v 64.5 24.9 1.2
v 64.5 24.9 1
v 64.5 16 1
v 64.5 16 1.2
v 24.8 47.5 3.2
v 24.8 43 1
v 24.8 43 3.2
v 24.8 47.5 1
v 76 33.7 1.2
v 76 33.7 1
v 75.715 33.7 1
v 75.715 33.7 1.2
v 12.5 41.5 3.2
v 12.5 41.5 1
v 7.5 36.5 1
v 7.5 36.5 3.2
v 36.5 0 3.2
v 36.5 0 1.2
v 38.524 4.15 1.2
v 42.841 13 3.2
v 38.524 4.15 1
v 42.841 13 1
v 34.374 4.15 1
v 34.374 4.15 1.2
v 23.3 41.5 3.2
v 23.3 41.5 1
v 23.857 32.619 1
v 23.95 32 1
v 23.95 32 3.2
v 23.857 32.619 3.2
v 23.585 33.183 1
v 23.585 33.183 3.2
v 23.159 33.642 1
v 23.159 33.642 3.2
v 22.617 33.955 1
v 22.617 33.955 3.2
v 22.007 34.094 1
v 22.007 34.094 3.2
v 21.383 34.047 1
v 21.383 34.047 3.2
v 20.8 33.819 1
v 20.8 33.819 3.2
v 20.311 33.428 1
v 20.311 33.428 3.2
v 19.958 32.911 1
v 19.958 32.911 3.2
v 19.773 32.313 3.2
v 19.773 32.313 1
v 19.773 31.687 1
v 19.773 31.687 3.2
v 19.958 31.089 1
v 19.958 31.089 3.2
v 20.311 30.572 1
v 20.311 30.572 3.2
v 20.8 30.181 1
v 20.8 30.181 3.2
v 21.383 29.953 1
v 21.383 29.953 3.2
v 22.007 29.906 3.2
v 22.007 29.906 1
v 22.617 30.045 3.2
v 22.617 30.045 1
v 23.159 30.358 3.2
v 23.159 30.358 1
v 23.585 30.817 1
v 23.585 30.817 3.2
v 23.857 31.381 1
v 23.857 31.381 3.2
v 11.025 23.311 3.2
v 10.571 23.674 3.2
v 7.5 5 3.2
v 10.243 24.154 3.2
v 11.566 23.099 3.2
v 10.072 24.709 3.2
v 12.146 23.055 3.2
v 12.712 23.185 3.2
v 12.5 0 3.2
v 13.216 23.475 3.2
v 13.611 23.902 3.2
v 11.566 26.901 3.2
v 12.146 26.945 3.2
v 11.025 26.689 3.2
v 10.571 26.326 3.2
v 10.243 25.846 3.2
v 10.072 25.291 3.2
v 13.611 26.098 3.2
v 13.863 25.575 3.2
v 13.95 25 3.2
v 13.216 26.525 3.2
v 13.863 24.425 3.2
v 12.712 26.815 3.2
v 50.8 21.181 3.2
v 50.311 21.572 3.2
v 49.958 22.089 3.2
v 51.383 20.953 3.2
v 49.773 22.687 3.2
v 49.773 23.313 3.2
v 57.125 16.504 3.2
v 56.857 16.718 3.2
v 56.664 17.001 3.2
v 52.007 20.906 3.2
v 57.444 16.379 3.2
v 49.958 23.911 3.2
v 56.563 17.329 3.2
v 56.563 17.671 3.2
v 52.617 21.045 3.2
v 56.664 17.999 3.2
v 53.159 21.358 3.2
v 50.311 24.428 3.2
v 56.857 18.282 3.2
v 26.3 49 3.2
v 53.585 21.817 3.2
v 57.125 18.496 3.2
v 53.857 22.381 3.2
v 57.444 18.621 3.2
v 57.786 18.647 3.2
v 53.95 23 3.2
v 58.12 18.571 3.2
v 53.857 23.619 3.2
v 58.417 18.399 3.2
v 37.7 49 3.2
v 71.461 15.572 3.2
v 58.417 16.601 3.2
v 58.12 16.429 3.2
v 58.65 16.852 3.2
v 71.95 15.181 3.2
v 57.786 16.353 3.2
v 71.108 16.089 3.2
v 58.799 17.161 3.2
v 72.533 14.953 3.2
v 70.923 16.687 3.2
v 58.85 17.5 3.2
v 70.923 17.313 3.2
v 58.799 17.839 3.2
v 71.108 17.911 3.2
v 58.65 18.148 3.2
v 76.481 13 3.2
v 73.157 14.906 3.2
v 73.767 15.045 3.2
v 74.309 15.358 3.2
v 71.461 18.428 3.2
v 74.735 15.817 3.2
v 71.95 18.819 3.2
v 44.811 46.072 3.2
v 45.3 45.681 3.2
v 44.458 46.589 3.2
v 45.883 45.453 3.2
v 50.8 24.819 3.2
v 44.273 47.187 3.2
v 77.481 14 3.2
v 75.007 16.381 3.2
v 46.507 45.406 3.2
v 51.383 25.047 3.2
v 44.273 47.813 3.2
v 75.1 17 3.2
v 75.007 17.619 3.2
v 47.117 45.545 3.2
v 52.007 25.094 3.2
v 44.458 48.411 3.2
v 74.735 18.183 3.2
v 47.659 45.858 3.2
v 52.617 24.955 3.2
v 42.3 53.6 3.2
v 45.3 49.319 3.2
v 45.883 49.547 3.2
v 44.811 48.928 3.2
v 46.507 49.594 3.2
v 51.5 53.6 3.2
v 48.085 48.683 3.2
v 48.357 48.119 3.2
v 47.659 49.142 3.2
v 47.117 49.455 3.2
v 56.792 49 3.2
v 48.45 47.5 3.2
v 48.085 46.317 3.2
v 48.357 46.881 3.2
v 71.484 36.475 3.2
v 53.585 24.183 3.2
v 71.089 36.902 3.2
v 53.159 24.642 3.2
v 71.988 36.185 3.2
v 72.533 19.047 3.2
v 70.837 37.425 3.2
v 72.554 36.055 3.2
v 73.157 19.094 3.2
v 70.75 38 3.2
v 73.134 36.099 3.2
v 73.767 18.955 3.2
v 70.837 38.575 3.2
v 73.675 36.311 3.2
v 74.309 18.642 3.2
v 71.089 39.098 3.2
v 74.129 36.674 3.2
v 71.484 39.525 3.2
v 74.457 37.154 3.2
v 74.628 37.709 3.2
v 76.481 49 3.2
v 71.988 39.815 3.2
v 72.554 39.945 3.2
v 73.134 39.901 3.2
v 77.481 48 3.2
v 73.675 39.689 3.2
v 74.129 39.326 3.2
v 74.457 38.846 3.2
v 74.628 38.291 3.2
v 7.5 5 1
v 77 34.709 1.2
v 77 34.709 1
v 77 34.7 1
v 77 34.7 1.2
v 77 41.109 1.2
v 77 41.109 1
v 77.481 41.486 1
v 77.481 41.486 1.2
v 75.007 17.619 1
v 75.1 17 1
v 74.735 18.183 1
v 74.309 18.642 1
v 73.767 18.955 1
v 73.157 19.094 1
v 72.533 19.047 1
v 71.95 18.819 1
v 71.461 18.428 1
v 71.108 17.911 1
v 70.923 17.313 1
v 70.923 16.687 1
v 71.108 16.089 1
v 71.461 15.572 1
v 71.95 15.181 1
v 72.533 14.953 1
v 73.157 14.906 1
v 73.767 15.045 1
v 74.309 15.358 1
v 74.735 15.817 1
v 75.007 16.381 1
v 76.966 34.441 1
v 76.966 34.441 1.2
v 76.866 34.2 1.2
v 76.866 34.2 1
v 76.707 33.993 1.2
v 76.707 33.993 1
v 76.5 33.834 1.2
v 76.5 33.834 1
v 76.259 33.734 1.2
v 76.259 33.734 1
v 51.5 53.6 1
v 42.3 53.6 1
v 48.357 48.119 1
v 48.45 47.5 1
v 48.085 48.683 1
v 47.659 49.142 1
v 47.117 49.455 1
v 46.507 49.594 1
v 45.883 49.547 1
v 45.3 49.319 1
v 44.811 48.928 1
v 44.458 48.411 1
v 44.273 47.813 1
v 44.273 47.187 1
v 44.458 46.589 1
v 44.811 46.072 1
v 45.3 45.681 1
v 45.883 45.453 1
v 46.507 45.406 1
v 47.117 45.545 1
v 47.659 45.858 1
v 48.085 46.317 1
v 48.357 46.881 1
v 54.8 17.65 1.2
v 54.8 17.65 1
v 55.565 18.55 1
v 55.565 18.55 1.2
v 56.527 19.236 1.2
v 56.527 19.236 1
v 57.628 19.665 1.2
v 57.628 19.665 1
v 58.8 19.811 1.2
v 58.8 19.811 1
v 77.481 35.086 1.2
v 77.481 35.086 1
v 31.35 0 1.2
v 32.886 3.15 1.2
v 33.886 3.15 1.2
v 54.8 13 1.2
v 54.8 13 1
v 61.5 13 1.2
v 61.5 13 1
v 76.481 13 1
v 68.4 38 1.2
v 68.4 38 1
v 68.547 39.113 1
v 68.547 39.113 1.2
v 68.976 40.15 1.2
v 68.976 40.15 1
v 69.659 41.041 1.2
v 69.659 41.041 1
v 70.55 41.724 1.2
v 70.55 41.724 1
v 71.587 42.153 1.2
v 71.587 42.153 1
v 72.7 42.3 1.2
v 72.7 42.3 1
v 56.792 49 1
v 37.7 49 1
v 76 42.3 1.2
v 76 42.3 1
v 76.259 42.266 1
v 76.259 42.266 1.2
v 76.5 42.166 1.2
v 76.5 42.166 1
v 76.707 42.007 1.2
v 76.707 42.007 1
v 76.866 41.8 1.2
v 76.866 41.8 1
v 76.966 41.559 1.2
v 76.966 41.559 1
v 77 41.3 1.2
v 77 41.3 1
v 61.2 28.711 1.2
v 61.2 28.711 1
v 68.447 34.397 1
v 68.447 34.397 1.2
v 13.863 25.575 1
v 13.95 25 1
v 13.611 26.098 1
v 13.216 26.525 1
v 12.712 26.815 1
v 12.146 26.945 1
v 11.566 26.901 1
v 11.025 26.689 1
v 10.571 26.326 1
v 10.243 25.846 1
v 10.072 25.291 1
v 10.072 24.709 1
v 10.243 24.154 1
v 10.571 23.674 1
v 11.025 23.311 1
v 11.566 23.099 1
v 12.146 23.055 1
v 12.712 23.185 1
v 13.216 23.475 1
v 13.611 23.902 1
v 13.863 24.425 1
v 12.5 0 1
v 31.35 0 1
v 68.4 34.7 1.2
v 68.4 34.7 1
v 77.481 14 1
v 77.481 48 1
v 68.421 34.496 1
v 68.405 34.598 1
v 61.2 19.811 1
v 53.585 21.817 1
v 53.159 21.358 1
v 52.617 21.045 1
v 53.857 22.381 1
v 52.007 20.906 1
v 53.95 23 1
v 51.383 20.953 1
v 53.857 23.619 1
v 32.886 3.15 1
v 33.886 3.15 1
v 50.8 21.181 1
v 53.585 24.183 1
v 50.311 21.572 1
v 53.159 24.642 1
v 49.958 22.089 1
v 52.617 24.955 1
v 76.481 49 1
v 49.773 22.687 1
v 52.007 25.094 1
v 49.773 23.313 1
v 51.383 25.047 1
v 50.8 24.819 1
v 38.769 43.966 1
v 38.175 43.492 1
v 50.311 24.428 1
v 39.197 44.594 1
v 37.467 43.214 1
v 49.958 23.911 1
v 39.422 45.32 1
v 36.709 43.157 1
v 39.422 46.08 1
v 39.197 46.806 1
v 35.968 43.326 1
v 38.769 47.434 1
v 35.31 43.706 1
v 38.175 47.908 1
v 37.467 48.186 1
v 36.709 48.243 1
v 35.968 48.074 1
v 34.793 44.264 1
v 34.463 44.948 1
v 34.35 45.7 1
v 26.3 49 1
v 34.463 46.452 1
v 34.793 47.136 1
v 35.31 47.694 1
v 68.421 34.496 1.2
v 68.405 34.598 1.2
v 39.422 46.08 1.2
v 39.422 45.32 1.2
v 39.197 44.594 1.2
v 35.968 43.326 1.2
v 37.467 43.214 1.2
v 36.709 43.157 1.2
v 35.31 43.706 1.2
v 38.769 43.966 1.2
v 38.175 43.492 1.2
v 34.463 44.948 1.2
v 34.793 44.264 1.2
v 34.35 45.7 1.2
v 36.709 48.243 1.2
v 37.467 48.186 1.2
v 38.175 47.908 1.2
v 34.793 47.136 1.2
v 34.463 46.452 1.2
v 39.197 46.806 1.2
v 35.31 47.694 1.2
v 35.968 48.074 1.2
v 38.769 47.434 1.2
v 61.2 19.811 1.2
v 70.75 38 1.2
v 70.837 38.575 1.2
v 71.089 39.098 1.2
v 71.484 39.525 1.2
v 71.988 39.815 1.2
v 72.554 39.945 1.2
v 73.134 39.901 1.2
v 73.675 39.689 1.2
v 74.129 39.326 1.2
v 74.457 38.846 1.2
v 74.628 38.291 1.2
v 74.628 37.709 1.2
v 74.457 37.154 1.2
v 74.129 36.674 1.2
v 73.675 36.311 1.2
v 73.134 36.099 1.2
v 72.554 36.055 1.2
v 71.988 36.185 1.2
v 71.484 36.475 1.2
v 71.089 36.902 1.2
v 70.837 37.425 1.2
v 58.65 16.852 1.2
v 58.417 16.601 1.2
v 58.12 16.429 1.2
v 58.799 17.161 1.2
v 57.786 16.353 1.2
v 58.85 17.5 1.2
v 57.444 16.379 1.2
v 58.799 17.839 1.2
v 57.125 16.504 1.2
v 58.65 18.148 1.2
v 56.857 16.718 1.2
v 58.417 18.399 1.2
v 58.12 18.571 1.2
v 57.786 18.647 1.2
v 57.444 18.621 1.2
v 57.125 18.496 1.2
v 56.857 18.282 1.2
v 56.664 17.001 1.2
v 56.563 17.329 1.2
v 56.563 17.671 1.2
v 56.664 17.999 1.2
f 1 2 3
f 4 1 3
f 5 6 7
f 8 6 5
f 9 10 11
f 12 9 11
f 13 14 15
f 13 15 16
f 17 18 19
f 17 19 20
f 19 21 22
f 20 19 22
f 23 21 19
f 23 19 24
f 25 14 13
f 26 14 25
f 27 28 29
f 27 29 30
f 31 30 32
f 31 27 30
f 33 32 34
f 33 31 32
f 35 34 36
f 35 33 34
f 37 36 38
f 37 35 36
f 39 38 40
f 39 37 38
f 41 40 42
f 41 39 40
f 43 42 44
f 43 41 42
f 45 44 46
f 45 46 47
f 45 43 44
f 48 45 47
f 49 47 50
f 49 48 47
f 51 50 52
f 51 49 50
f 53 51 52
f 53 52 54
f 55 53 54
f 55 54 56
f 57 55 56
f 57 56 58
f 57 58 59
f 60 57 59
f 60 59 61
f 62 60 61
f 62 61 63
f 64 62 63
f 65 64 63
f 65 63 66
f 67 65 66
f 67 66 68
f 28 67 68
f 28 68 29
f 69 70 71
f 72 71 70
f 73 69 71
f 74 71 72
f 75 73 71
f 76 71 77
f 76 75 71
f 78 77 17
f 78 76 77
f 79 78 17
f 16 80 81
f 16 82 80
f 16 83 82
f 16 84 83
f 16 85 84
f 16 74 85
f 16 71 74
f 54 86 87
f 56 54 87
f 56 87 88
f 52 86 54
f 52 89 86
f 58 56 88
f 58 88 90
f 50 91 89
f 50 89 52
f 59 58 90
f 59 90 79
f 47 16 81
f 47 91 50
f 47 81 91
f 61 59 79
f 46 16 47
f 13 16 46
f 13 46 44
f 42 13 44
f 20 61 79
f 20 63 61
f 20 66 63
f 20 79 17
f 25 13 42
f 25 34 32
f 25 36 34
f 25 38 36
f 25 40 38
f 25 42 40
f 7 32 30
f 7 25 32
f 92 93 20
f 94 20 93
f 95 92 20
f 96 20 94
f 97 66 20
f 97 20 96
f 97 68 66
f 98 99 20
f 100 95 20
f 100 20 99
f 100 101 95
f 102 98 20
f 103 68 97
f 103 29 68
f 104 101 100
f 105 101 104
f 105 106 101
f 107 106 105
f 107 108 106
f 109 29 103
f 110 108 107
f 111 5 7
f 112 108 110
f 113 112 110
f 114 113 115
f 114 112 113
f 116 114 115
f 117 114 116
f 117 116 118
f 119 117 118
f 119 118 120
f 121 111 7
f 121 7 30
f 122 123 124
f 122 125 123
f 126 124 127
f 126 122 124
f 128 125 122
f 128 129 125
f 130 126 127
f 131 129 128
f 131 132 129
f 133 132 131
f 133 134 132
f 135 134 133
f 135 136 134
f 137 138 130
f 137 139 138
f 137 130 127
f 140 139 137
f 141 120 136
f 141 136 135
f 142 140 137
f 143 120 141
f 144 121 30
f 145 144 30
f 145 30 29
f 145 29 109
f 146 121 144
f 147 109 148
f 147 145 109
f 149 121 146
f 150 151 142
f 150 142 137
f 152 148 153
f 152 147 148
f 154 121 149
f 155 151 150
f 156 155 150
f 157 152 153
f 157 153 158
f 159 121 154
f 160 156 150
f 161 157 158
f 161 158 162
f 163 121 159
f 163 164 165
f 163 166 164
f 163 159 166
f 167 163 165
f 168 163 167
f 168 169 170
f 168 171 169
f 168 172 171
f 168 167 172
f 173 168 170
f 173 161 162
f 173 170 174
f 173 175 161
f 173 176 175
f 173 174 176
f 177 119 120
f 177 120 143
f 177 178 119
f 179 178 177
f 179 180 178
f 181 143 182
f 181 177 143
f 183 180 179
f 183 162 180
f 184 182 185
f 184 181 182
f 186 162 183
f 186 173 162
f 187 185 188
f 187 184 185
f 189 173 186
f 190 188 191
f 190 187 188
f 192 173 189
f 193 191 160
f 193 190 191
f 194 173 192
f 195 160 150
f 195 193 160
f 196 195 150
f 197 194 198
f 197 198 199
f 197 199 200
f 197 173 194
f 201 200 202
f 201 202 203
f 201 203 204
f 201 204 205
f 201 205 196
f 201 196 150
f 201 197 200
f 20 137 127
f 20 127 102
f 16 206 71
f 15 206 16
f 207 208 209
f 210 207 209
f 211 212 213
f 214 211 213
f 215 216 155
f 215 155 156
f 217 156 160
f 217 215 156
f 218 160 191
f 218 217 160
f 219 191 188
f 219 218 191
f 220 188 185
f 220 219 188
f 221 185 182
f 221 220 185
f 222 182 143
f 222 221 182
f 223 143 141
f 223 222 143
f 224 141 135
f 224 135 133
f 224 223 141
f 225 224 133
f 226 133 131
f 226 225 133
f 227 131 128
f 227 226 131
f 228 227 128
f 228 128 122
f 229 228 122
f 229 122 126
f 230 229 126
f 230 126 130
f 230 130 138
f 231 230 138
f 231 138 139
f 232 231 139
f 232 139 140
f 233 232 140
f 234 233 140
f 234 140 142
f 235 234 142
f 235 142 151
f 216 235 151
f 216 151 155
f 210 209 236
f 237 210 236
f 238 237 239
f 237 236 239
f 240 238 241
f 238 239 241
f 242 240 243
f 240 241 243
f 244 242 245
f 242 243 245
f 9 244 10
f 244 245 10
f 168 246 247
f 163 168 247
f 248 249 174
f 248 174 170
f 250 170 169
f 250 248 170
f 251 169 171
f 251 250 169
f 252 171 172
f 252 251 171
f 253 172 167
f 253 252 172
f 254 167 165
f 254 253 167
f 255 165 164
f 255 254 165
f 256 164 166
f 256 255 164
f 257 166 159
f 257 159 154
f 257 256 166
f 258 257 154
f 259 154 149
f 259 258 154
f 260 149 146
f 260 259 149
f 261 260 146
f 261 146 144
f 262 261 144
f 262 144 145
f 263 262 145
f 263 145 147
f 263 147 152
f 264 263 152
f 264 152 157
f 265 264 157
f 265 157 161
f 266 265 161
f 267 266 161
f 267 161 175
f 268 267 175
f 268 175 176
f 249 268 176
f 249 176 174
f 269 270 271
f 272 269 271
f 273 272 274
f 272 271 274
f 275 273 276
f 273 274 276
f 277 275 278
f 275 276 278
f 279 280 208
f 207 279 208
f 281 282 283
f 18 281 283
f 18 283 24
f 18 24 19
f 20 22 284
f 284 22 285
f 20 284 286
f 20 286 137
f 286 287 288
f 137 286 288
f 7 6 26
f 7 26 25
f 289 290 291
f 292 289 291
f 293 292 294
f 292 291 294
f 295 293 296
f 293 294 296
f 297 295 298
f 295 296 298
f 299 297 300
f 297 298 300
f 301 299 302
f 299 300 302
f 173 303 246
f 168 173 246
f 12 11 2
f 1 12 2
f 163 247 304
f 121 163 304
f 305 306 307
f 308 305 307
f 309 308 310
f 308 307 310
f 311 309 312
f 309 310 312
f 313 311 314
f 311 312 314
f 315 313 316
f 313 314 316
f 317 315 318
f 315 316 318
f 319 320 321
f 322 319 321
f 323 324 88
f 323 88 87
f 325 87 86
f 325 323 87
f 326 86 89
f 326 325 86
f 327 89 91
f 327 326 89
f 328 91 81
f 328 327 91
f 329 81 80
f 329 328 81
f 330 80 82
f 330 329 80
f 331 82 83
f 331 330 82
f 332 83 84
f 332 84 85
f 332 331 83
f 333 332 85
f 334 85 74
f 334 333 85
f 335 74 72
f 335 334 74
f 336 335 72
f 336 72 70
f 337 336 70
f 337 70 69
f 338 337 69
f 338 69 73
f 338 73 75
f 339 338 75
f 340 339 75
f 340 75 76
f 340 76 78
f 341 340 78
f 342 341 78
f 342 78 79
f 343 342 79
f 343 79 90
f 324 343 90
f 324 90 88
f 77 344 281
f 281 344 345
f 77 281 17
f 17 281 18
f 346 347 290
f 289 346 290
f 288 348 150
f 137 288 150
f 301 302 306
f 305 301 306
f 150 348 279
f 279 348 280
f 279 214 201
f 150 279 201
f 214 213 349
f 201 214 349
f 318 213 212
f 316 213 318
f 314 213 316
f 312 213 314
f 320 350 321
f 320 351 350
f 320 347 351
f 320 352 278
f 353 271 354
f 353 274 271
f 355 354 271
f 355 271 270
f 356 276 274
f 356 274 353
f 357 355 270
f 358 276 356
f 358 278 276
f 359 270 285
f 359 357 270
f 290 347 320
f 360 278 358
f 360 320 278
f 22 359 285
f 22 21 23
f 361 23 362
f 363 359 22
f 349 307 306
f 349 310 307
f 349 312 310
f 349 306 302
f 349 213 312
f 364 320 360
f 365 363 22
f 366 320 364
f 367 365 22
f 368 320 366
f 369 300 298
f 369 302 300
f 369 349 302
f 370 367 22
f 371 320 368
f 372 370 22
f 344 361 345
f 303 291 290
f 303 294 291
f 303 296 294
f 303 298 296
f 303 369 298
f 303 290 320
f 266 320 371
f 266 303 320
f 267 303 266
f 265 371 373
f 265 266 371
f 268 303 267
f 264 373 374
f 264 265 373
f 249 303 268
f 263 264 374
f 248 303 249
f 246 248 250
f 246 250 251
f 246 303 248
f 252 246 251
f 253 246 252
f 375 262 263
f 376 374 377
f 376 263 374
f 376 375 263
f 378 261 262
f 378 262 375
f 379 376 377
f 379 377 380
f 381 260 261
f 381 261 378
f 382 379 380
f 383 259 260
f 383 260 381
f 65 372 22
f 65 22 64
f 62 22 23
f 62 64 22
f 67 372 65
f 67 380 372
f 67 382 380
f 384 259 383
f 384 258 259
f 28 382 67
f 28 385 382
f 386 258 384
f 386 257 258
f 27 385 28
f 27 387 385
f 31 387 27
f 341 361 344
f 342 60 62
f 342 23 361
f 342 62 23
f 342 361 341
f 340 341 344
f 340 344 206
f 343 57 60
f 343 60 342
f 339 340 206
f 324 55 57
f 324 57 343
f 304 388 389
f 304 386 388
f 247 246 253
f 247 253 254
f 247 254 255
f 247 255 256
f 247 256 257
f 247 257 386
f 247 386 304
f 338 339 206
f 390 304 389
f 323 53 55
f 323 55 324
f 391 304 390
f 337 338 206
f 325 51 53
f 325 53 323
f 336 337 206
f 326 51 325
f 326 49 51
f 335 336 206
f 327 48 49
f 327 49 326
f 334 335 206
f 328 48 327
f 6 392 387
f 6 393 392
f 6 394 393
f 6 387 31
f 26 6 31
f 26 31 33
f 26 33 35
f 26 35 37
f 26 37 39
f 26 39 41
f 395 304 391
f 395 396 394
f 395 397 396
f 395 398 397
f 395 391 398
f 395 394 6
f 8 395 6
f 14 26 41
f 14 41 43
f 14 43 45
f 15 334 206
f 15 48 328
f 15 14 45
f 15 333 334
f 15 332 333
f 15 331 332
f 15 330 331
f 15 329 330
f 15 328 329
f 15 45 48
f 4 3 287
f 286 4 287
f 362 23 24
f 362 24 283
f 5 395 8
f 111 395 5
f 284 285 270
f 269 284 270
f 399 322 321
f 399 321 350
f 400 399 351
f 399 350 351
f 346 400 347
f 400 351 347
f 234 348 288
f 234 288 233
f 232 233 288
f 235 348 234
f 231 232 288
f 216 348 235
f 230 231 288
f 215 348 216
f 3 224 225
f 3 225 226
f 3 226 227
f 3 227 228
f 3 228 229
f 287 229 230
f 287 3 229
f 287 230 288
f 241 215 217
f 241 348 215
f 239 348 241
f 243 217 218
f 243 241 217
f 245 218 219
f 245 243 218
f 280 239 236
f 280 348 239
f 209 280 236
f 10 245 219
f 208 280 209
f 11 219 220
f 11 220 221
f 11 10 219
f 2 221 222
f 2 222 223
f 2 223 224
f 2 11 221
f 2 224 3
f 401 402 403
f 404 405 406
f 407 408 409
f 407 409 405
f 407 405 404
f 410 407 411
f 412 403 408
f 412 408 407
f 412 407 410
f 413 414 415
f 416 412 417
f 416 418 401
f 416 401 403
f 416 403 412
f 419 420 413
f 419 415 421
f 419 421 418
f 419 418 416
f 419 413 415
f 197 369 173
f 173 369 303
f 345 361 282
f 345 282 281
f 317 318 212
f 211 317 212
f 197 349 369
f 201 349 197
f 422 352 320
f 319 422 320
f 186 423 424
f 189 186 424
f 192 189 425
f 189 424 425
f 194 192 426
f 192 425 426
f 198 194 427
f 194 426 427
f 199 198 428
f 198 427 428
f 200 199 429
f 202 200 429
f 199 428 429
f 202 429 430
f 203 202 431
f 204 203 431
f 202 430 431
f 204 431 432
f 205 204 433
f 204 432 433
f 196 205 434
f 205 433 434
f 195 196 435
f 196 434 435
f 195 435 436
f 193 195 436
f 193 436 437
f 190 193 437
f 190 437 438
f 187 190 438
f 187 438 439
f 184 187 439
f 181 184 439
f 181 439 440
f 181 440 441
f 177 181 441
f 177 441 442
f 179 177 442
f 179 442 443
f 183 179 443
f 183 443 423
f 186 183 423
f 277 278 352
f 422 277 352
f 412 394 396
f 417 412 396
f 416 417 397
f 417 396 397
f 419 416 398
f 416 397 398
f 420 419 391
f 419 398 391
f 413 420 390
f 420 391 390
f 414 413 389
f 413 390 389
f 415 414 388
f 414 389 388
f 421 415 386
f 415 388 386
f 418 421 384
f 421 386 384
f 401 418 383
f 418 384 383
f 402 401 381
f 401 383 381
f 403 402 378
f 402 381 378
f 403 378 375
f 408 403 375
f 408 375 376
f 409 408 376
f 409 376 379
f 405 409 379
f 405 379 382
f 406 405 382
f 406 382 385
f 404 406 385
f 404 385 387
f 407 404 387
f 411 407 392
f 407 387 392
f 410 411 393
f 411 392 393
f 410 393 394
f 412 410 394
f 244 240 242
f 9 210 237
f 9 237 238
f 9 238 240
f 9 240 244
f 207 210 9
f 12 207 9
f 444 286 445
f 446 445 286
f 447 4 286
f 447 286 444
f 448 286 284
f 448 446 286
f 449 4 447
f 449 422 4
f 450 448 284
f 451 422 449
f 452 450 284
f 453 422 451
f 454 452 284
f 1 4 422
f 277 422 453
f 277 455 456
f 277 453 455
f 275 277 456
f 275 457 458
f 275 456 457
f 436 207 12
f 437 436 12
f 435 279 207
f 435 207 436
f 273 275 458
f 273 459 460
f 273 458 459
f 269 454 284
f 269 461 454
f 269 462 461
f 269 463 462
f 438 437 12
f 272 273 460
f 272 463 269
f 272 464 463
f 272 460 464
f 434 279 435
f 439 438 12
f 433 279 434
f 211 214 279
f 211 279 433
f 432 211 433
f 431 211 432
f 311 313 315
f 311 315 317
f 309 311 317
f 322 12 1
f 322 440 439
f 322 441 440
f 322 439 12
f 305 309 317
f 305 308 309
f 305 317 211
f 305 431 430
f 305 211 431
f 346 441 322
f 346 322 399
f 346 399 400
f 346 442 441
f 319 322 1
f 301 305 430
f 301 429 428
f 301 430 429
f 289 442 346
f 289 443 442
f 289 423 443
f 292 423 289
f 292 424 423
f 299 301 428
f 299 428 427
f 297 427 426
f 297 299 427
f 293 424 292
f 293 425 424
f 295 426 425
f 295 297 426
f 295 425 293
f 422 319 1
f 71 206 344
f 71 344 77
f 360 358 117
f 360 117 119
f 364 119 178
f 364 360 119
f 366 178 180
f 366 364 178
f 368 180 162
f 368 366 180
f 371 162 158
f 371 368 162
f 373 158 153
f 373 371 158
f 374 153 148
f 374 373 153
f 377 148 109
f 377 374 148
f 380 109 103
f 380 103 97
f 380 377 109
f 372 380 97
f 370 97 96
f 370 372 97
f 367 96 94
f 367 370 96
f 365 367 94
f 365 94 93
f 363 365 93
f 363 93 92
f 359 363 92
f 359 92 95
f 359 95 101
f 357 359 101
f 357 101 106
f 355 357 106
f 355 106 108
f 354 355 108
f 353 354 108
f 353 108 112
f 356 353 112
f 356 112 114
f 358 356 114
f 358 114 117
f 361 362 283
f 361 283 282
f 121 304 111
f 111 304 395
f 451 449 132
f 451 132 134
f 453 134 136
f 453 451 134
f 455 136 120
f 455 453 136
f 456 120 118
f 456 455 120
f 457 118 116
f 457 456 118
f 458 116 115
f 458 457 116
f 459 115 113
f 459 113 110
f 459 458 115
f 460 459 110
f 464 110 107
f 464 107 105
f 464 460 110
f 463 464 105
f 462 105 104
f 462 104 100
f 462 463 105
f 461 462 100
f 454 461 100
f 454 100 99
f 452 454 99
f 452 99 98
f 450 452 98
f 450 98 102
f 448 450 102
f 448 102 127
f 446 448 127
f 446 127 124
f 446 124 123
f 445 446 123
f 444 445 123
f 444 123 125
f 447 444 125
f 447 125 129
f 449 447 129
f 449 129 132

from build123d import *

# Parameters (mm, degrees)
SKETCH_1_R          = 2.1
SKETCH_1_R_2        = 4.2
SKETCH_1_R_3        = 2.7
EXTRUDE_1_DEPTH     = 3.2
EXTRUDE_START       = -3.2
SKETCH_3_R          = 4.2
SKETCH_3_R_2        = 1.95
SKETCH_3_R_3        = 2.7
SKETCH_3_R_4        = 1.15
EXTRUDE_3_DEPTH     = 3.2
SKETCH_7_R          = 2.1
SKETCH_7_R_2        = 1.15
SKETCH_7_R_3        = 1.95
CUT_EXTRUDE_1_DEPTH = 1
CHAMFER_1_SIZE      = 1
CHAMFER_3_SIZE      = 1
SKETCH_12_R         = 1.95
CUT_EXTRUDE_2_DEPTH = 10
SKETCH_13_W         = 24.8
SKETCH_13_H         = 7.5
CUT_EXTRUDE_3_DEPTH = 10
CHAMFER_4_SIZE      = 1.5
SKETCH_15_R         = 2.55
CUT_EXTRUDE_5_DEPTH = 0.2
CHAMFER_5_SIZE      = 1
CUT_EXTRUDE_6_DEPTH = 0.2
SKETCH_17_W         = 17.729564923
SKETCH_17_H         = 70.765418615
CUT_EXTRUDE_7_DEPTH = 10
CHAMFER_6_SIZE      = 5


with BuildPart() as part:
    # 스케치1 → 보스-돌출1 (new body)
    with BuildSketch(Plane.XY):
        Polygon((0, 0), (36.5, 0), (42.840523651, 13), (77.480523651, 13), (77.480523651, 49), (56.791694673, 49), (51.5, 53.6), (42.3, 53.6), (37.7, 49), (11.9, 49), (0, 37.1), align=None)
        with Locations((46.35, 47.5)):
            Circle(SKETCH_1_R, mode=Mode.SUBTRACT)
        with Locations((12, 25)):
            Circle(SKETCH_1_R_2, mode=Mode.SUBTRACT)
        with Locations((57.7, 17.5)):
            Circle(SKETCH_1_R_3, mode=Mode.SUBTRACT)
        with Locations((51.85, 23)):
            Circle(SKETCH_1_R, mode=Mode.SUBTRACT)
        with Locations((73, 17)):
            Circle(SKETCH_1_R, mode=Mode.SUBTRACT)
        with Locations((21.85, 32)):
            Circle(SKETCH_1_R, mode=Mode.SUBTRACT)
    extrude(amount=EXTRUDE_1_DEPTH)

    # 스케치3 → 보스-돌출3 (add)
    # profile 1 of 2: a face of its own
    with BuildSketch(Plane.XY.offset(3.2).offset(EXTRUDE_START)):
        with Locations((12, 25)):
            Circle(SKETCH_3_R)
        with Locations((12, 25)):
            Circle(SKETCH_3_R_2, mode=Mode.SUBTRACT)
    # profile 2 of 2: a face of its own
    with BuildSketch(Plane.XY.offset(3.2).offset(EXTRUDE_START)):
        with Locations((57.7, 17.5)):
            Circle(SKETCH_3_R_3)
        with Locations((57.7, 17.5)):
            Circle(SKETCH_3_R_4, mode=Mode.SUBTRACT)
    extrude(amount=EXTRUDE_3_DEPTH)

    # 스케치7 → 컷-돌출1 (cut)
    with BuildSketch(Plane(origin=(0, 0, 0), x_dir=(-1, 0, 0), z_dir=(0, 0, -1))):
        Polygon((-11.9, 49), (-37.7, 49), (-42.3, 53.6), (-51.5, 53.6), (-56.791694673, 49), (-77.480523651, 49), (-77.480523651, 13), (-42.840523651, 13), (-36.5, 0), (0, 0), (0, 37.1), align=None)
        with Locations((-73, 17)):
            Circle(SKETCH_7_R, mode=Mode.SUBTRACT)
        with Locations(Location((-57.7, 17.5, 0), (0, 0, 180))):
            Circle(SKETCH_7_R_2, mode=Mode.SUBTRACT)
        with Locations((-51.85, 23)):
            Circle(SKETCH_7_R, mode=Mode.SUBTRACT)
        with Locations((-21.85, 32)):
            Circle(SKETCH_7_R, mode=Mode.SUBTRACT)
        with Locations(Location((-12, 25, 0), (0, 0, 180))):
            Circle(SKETCH_7_R_3, mode=Mode.SUBTRACT)
        with Locations((-46.35, 47.5)):
            Circle(SKETCH_7_R, mode=Mode.SUBTRACT)
    extrude(amount=-CUT_EXTRUDE_1_DEPTH, mode=Mode.SUBTRACT)

    # 모따기1
    chamfer_1_edges = [part.edges().sort_by_distance(p)[0] for p in [
        (0, 0, 2.1),
    ]]
    chamfer(chamfer_1_edges, length=CHAMFER_1_SIZE)

    # 모따기3
    chamfer_3_edges = [part.edges().sort_by_distance(p)[0] for p in [
        (77.480523651, 13, 2.1),
    ]]
    chamfer(chamfer_3_edges, length=CHAMFER_3_SIZE)

    # 스케치12 → 컷-돌출2 (cut)
    with BuildSketch(Plane(origin=(0, 0, 1), x_dir=(-1, 0, 0), z_dir=(0, 0, -1))):
        with Locations((-72.7, 38)):
            Circle(SKETCH_12_R)
    extrude(amount=-CUT_EXTRUDE_2_DEPTH, mode=Mode.SUBTRACT)

    # 스케치13 → 컷-돌출3 (cut)
    with BuildSketch(Plane.XY):
        with Locations((12.4, 45.25)):
            Rectangle(SKETCH_13_W, SKETCH_13_H)
    extrude(amount=CUT_EXTRUDE_3_DEPTH, mode=Mode.SUBTRACT)

    # 모따기4
    chamfer_4_edges = [part.edges().sort_by_distance(p)[0] for p in [
        (24.8, 49, 2.1),
        (24.8, 41.5, 2.1),
    ]]
    chamfer(chamfer_4_edges, length=CHAMFER_4_SIZE)

    # 스케치15 → 컷-돌출5 (cut)
    with BuildSketch(Plane(origin=(0, 0, 1), x_dir=(-1, 0, 0), z_dir=(0, 0, -1))):
        with Locations((-36.9, 45.7)):
            Circle(SKETCH_15_R)
        with BuildLine():
            Line((-72.7, 42.3), (-76, 42.3))
            ThreePointArc((-76, 42.3), (-76.707106781, 42.007106781), (-77, 41.3))
            Line((-77, 41.3), (-77, 34.7))
            ThreePointArc((-77, 34.7), (-76.707106781, 33.992893219), (-76, 33.7))
            Line((-76, 33.7), (-69.4, 33.7))
            ThreePointArc((-69.4, 33.7), (-68.692893219, 33.992893219), (-68.4, 34.7))
            Line((-68.4, 34.7), (-68.4, 38))
            ThreePointArc((-68.4, 38), (-69.659440841, 41.040559159), (-72.7, 42.3))
        make_face()
    extrude(amount=-CUT_EXTRUDE_5_DEPTH, mode=Mode.SUBTRACT)

    # 모따기5
    chamfer_5_edges = [part.edges().sort_by_distance(p)[0] for p in [
        (77.480523651, 49, 2.1),
    ]]
    chamfer(chamfer_5_edges, length=CHAMFER_5_SIZE)

    # 스케치16 → 컷-돌출6 (cut)
    with BuildSketch(Plane(origin=(0, 0, 1), x_dir=(-1, 0, 0), z_dir=(0, 0, -1))):
        with BuildLine():
            Line((-61.2, 19.810538853), (-61.2, 28.710538853))
            Line((-61.2, 28.710538853), (-77.480523651, 41.485624748))
            Line((-77.480523651, 41.485624748), (-77.480523651, 35.085624748))
            Line((-77.480523651, 35.085624748), (-64.5, 24.9))
            Line((-64.5, 24.9), (-64.5, 16))
            Line((-64.5, 16), (-61.5, 13))
            Line((-61.5, 13), (-61.2, 13))
            Line((-61.2, 13), (-54.8, 13))
            Line((-54.8, 13), (-54.8, 17.65))
            ThreePointArc((-54.8, 17.65), (-56.526900347, 19.23588339), (-58.8, 19.810538853))
            Line((-58.8, 19.810538853), (-61.2, 19.810538853))
        make_face()
        Polygon((-38.524090243, 4.15), (-34.374090243, 4.15), (-33.886357654, 3.15), (-32.886357654, 3.15), (-31.35, 0), (-36.5, 0), align=None)
    extrude(amount=-CUT_EXTRUDE_6_DEPTH, mode=Mode.SUBTRACT)

    # 스케치17 → 컷-돌출7 (cut)
    with BuildSketch(Plane.XY):
        with Locations((-1.364782461, 26.542327615)):
            Rectangle(SKETCH_17_W, SKETCH_17_H)
    extrude(amount=CUT_EXTRUDE_7_DEPTH, mode=Mode.SUBTRACT)

    # 모따기6
    chamfer_6_edges = [part.edges().sort_by_distance(p)[0] for p in [
        (7.5, 41.5, 2.1),
        (7.5, 0, 2.1),
    ]]
    chamfer(chamfer_6_edges, length=CHAMFER_6_SIZE)


solid = part.part
